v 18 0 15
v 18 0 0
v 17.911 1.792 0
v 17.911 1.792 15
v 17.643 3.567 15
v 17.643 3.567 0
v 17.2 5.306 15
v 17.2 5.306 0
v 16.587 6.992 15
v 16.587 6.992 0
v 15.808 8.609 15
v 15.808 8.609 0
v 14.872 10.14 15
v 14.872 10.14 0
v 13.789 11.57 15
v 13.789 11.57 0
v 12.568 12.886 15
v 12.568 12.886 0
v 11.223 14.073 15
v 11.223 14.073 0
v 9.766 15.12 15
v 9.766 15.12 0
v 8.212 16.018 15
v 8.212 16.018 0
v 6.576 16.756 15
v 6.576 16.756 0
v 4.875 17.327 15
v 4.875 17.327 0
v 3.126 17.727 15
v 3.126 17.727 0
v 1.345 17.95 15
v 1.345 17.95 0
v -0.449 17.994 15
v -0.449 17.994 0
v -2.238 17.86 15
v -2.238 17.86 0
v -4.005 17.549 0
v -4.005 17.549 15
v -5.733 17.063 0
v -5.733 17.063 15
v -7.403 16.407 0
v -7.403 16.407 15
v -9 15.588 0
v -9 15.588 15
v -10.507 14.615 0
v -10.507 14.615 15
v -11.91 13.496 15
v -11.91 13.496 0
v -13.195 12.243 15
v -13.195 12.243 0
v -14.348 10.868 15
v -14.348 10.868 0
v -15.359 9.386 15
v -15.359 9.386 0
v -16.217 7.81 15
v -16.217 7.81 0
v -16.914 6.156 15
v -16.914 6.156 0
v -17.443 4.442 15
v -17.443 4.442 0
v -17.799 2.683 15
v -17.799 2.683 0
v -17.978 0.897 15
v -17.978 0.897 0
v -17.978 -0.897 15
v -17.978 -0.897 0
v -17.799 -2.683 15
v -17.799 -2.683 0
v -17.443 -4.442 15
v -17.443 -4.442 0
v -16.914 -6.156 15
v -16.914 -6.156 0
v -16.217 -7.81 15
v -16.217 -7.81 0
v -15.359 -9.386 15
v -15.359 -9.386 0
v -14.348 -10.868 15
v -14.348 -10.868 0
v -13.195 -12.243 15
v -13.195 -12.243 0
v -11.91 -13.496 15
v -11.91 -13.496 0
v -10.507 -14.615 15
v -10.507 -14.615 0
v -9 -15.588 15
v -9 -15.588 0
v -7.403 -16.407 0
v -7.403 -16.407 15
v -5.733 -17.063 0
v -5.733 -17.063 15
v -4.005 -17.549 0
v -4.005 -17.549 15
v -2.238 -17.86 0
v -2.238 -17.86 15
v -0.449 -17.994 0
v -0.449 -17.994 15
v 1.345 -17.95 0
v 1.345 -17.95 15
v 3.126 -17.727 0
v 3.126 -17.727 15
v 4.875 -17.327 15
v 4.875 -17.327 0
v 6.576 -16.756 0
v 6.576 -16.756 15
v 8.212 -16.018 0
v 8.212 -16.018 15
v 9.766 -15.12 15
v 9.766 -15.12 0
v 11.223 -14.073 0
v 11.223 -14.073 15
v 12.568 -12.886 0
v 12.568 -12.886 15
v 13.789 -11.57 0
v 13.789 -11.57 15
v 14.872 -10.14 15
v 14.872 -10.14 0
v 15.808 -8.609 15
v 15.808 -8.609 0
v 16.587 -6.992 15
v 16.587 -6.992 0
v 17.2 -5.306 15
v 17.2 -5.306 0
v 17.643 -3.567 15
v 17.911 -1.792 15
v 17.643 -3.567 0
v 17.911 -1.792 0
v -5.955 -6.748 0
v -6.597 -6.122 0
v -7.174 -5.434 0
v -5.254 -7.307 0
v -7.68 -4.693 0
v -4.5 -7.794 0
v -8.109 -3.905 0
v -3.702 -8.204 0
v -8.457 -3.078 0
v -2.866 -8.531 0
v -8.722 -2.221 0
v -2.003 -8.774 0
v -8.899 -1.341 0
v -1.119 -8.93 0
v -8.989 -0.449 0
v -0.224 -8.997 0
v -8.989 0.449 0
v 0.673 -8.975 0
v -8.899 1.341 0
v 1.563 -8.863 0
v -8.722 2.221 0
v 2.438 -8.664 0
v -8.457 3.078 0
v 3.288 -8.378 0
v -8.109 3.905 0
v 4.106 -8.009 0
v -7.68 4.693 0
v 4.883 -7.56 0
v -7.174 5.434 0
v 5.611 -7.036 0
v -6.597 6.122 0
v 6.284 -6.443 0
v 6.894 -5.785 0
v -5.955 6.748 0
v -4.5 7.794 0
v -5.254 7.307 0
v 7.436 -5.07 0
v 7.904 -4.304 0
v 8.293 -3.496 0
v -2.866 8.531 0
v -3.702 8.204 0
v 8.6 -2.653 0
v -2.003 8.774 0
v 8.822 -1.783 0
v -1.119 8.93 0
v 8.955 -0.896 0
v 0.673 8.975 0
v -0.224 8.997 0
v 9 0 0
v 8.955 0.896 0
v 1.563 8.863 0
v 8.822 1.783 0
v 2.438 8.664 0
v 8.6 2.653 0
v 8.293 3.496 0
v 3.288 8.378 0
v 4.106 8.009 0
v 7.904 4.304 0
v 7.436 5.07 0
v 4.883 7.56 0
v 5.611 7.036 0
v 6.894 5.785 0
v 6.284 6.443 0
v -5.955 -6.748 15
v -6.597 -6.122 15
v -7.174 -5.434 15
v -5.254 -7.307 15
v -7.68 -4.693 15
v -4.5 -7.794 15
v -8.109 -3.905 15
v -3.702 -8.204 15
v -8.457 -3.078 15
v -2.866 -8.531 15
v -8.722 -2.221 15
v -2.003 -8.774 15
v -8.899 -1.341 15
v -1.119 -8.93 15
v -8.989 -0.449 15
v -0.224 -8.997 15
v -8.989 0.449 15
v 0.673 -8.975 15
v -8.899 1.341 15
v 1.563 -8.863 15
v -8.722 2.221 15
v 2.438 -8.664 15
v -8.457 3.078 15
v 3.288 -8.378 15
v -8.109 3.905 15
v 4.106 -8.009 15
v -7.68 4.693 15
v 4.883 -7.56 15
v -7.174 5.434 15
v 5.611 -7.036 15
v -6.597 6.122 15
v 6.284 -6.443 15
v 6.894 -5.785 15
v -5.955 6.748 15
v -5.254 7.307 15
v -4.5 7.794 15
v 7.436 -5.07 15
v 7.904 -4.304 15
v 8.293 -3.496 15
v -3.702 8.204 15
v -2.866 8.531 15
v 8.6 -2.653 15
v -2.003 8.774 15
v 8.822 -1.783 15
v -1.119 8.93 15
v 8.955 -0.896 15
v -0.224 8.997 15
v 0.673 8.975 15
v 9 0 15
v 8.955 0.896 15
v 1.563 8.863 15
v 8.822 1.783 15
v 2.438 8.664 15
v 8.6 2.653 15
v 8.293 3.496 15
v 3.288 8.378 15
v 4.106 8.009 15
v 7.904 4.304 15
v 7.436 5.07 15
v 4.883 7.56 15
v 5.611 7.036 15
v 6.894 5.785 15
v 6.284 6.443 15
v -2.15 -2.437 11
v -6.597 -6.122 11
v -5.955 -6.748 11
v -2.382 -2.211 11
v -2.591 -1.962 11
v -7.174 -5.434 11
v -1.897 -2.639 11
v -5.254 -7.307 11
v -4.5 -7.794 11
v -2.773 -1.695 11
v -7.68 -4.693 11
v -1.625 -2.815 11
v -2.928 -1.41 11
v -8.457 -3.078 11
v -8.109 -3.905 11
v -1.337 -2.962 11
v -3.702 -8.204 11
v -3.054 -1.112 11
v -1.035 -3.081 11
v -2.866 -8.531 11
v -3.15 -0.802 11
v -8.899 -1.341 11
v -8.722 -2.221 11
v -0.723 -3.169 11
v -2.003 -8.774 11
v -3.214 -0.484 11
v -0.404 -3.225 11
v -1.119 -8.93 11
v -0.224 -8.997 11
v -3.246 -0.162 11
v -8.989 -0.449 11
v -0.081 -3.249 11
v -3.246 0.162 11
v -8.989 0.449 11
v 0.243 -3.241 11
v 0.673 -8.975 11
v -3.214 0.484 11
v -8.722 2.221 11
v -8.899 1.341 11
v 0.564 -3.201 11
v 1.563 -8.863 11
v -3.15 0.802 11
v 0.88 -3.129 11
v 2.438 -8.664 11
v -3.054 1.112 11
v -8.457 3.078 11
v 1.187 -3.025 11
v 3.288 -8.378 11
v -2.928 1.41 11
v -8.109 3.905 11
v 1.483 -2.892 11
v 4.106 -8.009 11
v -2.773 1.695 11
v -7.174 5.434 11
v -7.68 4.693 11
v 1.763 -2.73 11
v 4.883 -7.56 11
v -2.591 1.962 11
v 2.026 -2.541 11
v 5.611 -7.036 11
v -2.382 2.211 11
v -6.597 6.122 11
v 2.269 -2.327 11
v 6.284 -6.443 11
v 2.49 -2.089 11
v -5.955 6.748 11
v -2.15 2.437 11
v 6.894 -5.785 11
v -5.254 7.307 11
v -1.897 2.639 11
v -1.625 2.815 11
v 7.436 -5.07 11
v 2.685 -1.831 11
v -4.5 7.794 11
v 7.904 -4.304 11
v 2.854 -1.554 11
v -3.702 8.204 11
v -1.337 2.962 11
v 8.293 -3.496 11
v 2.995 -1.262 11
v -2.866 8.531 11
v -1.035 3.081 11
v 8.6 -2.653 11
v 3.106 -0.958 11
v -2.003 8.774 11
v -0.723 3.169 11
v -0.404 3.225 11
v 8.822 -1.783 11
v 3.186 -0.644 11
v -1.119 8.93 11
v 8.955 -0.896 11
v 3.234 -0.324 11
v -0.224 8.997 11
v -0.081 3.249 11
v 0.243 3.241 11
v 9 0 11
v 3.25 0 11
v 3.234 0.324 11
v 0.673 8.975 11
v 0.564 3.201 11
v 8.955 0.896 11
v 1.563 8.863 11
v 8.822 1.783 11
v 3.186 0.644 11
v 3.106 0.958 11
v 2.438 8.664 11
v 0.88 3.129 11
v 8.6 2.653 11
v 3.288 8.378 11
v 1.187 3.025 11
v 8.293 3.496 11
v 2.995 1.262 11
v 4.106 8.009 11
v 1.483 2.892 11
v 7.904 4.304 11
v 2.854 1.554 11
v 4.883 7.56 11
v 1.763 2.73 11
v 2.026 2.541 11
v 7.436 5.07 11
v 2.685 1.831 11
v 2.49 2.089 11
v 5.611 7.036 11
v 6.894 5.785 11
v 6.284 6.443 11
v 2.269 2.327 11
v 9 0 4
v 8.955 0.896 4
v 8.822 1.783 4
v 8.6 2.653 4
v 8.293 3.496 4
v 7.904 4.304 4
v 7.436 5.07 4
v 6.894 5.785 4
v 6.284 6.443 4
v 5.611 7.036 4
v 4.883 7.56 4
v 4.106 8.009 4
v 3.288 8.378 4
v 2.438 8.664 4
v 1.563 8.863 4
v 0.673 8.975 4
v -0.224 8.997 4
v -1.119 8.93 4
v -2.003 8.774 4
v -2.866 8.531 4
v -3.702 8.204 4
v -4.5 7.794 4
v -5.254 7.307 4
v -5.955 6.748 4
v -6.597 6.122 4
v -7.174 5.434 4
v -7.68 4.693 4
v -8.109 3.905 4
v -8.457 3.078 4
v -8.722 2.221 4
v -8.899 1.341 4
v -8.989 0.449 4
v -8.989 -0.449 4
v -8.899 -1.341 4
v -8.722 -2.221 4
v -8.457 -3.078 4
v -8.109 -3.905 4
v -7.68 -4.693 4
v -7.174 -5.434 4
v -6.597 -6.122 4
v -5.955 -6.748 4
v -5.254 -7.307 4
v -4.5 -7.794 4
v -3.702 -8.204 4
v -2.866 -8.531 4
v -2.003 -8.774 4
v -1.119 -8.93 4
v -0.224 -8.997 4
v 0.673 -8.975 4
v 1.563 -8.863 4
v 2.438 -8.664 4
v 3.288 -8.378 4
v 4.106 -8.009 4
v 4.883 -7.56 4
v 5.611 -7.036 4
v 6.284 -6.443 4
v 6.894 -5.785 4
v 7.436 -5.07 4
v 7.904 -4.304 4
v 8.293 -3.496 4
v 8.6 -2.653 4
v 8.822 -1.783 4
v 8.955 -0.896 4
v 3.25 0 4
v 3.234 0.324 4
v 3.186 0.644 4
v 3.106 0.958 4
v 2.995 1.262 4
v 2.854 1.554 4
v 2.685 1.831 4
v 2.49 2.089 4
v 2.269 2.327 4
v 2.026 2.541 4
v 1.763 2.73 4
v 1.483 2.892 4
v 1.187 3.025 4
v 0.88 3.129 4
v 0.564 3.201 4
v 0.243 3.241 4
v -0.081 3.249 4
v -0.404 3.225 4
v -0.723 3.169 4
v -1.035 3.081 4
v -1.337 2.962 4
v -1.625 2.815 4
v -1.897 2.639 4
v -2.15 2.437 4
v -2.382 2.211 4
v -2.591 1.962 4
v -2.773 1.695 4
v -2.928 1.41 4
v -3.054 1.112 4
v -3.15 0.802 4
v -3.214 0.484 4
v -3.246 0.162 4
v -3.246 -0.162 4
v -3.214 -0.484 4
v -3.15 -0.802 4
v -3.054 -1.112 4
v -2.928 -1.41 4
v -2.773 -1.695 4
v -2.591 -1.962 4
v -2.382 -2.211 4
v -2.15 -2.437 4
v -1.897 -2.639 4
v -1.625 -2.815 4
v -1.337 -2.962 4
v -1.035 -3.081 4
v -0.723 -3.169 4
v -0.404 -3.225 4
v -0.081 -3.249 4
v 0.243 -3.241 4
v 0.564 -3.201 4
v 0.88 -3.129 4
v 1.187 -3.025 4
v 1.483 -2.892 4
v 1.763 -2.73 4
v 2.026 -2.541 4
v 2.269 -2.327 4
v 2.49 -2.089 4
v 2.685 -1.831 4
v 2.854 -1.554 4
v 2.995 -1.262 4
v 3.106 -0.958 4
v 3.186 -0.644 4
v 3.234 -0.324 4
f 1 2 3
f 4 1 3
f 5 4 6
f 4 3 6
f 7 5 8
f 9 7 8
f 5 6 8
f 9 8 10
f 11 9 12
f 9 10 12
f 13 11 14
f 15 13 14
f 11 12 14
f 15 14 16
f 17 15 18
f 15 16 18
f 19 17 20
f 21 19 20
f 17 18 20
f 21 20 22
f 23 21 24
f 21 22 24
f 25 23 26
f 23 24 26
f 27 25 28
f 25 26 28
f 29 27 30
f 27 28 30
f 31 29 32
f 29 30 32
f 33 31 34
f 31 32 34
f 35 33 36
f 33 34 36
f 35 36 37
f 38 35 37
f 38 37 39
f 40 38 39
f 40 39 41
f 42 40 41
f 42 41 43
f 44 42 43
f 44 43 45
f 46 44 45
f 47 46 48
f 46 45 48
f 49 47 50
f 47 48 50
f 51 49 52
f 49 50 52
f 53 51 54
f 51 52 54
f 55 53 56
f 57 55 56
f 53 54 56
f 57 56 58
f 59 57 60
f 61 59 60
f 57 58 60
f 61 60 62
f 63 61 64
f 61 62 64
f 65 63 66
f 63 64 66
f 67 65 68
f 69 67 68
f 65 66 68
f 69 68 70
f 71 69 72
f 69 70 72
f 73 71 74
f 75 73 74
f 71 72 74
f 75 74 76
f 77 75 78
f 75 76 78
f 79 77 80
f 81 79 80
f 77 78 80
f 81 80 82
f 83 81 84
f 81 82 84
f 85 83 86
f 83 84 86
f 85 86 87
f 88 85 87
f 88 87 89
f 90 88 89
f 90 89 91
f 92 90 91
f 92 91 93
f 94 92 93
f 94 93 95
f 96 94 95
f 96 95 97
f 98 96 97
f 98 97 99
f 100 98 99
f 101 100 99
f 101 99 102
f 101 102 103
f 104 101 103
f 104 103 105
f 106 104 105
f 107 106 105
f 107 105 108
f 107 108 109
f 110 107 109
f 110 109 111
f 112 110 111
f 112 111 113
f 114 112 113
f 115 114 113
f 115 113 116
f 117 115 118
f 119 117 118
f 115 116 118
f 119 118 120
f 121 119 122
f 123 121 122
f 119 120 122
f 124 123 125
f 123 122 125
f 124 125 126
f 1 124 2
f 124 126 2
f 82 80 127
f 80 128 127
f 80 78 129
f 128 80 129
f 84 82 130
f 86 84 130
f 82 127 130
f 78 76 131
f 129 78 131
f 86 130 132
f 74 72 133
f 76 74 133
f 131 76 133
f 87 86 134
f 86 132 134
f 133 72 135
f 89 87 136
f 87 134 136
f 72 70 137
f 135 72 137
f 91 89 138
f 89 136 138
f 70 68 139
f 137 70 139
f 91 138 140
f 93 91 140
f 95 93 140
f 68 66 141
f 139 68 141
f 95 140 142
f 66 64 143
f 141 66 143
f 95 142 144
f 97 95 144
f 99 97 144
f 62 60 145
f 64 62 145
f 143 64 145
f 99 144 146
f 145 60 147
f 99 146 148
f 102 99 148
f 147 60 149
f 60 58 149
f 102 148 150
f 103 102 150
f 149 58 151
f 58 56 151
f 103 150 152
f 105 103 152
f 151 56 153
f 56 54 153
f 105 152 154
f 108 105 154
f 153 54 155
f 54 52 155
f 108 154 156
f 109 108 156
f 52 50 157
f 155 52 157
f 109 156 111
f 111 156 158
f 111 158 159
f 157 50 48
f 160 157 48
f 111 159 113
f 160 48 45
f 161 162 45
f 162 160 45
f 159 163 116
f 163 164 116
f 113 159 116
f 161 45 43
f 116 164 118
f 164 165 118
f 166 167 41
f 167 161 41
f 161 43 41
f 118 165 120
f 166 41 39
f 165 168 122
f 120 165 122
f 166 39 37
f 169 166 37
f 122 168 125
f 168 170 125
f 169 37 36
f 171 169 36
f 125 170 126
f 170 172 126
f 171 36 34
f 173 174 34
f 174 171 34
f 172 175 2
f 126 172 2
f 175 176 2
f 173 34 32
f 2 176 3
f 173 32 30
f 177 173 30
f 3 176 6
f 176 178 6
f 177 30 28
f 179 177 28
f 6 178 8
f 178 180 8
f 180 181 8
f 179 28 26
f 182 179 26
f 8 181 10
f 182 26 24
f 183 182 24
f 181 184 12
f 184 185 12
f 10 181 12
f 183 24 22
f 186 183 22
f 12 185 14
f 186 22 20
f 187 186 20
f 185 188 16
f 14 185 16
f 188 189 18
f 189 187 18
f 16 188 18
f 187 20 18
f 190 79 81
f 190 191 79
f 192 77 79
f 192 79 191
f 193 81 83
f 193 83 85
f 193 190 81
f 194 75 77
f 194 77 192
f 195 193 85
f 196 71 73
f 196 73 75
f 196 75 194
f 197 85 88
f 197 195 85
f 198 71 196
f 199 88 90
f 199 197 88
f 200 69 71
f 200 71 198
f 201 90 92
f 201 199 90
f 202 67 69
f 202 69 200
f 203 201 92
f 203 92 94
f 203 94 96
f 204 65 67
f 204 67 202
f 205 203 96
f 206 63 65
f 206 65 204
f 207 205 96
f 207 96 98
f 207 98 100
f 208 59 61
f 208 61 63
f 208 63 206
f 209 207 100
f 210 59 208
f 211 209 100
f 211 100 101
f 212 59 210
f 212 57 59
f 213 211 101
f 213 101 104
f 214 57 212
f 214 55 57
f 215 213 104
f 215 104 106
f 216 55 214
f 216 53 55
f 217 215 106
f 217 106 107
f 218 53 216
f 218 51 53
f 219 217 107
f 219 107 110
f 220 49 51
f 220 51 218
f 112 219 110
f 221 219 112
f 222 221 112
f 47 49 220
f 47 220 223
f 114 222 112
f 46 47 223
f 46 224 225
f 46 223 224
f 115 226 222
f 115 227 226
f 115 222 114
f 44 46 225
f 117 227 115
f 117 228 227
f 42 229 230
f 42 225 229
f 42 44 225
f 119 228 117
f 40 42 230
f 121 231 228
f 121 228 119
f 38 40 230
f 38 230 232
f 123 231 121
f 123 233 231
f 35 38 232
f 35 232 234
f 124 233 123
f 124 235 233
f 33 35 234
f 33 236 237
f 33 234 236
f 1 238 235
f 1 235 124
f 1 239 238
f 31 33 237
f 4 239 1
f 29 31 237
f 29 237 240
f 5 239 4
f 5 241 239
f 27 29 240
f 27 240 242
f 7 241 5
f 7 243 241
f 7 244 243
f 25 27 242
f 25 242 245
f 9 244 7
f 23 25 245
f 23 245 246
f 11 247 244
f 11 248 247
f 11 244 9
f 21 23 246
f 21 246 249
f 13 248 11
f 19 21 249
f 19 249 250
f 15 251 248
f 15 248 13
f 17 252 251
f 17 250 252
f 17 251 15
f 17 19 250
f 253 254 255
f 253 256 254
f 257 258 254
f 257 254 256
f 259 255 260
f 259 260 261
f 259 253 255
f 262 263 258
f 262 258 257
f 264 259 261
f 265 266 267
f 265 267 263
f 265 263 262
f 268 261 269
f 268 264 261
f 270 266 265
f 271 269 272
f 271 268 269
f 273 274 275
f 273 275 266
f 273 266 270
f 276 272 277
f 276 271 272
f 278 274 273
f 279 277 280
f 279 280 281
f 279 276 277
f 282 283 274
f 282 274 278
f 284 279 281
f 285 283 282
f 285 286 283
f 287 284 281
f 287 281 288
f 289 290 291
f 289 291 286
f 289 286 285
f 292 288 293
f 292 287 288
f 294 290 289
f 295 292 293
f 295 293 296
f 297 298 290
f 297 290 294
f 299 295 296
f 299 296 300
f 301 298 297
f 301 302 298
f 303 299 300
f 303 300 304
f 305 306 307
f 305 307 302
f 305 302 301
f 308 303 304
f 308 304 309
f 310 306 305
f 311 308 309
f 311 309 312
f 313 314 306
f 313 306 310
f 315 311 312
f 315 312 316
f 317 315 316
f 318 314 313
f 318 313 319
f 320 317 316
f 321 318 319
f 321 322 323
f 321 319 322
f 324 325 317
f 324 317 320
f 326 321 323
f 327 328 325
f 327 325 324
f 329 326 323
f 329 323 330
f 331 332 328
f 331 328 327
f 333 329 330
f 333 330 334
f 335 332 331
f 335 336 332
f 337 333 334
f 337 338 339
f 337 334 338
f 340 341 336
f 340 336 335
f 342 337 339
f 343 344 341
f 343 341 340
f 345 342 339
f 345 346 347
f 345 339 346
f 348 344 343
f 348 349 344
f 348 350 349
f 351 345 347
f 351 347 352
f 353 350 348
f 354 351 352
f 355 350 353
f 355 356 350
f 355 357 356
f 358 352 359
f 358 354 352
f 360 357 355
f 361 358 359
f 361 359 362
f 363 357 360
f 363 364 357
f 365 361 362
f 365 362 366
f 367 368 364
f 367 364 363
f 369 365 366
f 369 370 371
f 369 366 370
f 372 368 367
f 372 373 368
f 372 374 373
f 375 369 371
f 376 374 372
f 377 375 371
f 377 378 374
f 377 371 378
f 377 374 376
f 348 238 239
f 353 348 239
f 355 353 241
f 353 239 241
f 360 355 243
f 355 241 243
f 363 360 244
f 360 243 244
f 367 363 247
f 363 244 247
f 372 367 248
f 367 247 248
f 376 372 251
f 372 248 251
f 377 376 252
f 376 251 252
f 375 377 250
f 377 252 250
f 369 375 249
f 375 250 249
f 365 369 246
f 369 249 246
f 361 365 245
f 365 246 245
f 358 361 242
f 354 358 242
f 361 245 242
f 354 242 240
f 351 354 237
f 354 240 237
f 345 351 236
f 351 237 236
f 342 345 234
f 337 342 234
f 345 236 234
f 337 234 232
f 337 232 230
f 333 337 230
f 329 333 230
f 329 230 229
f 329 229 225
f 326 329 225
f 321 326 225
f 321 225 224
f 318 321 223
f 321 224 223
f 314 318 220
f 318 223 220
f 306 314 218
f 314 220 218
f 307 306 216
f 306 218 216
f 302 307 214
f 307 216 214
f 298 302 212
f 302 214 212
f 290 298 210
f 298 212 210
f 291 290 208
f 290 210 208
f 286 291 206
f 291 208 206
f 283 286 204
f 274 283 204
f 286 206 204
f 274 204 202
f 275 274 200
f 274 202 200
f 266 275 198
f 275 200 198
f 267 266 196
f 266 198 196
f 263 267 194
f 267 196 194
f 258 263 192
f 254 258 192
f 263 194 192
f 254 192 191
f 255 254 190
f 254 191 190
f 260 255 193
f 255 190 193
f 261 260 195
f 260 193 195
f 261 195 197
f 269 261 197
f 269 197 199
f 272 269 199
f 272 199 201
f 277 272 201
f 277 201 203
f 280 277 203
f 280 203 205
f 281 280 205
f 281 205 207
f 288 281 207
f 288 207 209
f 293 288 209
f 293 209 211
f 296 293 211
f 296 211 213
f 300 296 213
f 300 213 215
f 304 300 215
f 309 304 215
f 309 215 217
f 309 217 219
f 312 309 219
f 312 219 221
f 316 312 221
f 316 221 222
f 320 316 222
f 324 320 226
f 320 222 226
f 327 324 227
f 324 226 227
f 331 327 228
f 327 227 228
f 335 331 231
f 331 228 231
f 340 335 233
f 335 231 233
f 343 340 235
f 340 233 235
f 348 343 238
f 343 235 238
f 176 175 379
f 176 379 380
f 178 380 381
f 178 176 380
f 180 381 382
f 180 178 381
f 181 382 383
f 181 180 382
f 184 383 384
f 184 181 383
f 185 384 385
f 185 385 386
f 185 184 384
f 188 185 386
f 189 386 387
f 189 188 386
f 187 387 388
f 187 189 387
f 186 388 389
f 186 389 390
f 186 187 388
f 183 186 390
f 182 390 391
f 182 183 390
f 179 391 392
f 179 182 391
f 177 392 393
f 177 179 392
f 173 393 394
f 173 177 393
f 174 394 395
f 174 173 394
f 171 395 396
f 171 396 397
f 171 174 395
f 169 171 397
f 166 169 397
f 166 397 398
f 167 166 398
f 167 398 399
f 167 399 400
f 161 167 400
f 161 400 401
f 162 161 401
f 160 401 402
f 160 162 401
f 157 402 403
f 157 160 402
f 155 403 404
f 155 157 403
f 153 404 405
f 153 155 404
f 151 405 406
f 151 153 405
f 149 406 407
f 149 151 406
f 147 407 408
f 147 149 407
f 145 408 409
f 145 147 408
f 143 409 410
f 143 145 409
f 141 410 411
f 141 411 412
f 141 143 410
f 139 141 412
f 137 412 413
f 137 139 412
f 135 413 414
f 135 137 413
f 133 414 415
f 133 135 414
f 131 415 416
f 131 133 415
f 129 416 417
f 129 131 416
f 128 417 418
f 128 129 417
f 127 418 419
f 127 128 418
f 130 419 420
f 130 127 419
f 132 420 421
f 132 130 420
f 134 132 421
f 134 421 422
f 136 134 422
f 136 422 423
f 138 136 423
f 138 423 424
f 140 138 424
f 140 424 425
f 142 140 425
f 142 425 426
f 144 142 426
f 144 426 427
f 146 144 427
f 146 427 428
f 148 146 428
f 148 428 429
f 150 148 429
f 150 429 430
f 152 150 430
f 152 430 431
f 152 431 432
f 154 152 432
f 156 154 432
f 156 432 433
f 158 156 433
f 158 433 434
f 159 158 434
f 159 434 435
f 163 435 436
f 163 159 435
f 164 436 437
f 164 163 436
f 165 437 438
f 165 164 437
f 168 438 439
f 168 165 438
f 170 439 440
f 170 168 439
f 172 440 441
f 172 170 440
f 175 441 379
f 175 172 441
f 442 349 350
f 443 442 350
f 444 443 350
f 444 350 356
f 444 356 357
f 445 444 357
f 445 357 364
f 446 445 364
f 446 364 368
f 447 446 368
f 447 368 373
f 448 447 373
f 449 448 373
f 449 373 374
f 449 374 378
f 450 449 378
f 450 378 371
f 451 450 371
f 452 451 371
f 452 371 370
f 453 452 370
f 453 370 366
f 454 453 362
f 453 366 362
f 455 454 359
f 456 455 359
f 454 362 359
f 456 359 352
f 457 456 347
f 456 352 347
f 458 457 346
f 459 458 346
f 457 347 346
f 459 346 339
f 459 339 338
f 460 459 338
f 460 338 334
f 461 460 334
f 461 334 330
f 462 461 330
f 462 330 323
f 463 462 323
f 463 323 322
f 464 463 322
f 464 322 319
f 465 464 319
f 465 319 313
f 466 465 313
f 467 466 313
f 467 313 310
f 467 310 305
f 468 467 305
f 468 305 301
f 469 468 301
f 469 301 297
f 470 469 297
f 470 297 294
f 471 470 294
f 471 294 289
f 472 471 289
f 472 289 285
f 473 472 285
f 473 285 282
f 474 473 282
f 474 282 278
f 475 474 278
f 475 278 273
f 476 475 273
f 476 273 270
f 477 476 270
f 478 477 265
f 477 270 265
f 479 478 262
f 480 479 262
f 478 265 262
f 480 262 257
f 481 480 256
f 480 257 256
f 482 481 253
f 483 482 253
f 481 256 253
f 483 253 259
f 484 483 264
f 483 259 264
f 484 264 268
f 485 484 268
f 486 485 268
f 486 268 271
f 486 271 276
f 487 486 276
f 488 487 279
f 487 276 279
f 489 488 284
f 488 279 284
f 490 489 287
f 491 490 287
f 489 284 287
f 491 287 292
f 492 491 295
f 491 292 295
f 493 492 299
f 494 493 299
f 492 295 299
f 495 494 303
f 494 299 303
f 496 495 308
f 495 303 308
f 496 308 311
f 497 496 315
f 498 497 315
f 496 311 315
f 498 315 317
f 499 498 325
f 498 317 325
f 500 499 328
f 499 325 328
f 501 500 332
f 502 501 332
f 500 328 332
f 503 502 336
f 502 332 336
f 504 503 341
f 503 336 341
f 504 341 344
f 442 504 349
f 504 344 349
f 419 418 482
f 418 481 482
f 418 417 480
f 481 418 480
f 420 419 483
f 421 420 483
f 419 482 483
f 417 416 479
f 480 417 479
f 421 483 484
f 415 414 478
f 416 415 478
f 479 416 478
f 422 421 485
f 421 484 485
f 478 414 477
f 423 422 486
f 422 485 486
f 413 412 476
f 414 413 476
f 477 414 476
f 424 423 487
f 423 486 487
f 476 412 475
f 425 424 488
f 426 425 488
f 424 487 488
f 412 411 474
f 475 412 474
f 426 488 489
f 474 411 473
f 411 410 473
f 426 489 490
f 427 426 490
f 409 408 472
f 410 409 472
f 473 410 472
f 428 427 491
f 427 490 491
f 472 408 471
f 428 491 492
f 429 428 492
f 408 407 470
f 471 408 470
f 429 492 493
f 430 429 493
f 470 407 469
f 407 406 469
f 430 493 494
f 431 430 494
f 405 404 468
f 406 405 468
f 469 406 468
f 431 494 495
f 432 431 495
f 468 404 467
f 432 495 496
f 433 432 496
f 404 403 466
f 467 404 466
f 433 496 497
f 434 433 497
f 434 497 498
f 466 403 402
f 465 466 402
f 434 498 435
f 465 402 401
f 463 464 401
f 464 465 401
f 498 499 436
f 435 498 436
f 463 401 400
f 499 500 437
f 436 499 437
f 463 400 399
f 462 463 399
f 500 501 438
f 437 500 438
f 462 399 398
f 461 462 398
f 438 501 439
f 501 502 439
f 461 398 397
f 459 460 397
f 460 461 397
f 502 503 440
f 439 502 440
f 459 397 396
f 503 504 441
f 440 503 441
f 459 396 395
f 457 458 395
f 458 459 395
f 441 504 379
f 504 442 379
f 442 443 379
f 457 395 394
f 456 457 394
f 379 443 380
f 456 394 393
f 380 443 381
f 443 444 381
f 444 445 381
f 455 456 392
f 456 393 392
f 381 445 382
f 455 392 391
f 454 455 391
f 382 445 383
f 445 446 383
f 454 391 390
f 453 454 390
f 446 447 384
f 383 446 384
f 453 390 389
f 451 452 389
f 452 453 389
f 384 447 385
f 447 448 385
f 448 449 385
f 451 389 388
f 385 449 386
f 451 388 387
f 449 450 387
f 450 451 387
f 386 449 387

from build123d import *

# Parameters (mm, degrees)
F0_R     = 18
F1_DEPTH = 15
F2_R     = 9
F2_R_2   = 3.25
F3_DEPTH = 4
F4_DEPTH = 25
F5_R     = 9
F6_DEPTH = 4


with BuildPart() as f1:
    # F0 (on Top) → F1 (new body)
    with BuildSketch(Plane.XY):
        Circle(F0_R)
    extrude(amount=F1_DEPTH)

    # F2 (on face) → F3 (cut)
    with BuildSketch(Plane.XY.offset(15)):
        Circle(F2_R)
        Circle(F2_R_2, mode=Mode.SUBTRACT)
    extrude(amount=-F3_DEPTH, mode=Mode.SUBTRACT)

    # F2 (on face) → F4 (cut)
    with BuildSketch(Plane.XY.offset(15)):
        Circle(F2_R_2)
    extrude(amount=-F4_DEPTH, mode=Mode.SUBTRACT)

    # F5 (on face) → F6 (cut)
    with BuildSketch(Plane.XY):
        Circle(F5_R)
    extrude(amount=F6_DEPTH, mode=Mode.SUBTRACT)


solid = f1.part
